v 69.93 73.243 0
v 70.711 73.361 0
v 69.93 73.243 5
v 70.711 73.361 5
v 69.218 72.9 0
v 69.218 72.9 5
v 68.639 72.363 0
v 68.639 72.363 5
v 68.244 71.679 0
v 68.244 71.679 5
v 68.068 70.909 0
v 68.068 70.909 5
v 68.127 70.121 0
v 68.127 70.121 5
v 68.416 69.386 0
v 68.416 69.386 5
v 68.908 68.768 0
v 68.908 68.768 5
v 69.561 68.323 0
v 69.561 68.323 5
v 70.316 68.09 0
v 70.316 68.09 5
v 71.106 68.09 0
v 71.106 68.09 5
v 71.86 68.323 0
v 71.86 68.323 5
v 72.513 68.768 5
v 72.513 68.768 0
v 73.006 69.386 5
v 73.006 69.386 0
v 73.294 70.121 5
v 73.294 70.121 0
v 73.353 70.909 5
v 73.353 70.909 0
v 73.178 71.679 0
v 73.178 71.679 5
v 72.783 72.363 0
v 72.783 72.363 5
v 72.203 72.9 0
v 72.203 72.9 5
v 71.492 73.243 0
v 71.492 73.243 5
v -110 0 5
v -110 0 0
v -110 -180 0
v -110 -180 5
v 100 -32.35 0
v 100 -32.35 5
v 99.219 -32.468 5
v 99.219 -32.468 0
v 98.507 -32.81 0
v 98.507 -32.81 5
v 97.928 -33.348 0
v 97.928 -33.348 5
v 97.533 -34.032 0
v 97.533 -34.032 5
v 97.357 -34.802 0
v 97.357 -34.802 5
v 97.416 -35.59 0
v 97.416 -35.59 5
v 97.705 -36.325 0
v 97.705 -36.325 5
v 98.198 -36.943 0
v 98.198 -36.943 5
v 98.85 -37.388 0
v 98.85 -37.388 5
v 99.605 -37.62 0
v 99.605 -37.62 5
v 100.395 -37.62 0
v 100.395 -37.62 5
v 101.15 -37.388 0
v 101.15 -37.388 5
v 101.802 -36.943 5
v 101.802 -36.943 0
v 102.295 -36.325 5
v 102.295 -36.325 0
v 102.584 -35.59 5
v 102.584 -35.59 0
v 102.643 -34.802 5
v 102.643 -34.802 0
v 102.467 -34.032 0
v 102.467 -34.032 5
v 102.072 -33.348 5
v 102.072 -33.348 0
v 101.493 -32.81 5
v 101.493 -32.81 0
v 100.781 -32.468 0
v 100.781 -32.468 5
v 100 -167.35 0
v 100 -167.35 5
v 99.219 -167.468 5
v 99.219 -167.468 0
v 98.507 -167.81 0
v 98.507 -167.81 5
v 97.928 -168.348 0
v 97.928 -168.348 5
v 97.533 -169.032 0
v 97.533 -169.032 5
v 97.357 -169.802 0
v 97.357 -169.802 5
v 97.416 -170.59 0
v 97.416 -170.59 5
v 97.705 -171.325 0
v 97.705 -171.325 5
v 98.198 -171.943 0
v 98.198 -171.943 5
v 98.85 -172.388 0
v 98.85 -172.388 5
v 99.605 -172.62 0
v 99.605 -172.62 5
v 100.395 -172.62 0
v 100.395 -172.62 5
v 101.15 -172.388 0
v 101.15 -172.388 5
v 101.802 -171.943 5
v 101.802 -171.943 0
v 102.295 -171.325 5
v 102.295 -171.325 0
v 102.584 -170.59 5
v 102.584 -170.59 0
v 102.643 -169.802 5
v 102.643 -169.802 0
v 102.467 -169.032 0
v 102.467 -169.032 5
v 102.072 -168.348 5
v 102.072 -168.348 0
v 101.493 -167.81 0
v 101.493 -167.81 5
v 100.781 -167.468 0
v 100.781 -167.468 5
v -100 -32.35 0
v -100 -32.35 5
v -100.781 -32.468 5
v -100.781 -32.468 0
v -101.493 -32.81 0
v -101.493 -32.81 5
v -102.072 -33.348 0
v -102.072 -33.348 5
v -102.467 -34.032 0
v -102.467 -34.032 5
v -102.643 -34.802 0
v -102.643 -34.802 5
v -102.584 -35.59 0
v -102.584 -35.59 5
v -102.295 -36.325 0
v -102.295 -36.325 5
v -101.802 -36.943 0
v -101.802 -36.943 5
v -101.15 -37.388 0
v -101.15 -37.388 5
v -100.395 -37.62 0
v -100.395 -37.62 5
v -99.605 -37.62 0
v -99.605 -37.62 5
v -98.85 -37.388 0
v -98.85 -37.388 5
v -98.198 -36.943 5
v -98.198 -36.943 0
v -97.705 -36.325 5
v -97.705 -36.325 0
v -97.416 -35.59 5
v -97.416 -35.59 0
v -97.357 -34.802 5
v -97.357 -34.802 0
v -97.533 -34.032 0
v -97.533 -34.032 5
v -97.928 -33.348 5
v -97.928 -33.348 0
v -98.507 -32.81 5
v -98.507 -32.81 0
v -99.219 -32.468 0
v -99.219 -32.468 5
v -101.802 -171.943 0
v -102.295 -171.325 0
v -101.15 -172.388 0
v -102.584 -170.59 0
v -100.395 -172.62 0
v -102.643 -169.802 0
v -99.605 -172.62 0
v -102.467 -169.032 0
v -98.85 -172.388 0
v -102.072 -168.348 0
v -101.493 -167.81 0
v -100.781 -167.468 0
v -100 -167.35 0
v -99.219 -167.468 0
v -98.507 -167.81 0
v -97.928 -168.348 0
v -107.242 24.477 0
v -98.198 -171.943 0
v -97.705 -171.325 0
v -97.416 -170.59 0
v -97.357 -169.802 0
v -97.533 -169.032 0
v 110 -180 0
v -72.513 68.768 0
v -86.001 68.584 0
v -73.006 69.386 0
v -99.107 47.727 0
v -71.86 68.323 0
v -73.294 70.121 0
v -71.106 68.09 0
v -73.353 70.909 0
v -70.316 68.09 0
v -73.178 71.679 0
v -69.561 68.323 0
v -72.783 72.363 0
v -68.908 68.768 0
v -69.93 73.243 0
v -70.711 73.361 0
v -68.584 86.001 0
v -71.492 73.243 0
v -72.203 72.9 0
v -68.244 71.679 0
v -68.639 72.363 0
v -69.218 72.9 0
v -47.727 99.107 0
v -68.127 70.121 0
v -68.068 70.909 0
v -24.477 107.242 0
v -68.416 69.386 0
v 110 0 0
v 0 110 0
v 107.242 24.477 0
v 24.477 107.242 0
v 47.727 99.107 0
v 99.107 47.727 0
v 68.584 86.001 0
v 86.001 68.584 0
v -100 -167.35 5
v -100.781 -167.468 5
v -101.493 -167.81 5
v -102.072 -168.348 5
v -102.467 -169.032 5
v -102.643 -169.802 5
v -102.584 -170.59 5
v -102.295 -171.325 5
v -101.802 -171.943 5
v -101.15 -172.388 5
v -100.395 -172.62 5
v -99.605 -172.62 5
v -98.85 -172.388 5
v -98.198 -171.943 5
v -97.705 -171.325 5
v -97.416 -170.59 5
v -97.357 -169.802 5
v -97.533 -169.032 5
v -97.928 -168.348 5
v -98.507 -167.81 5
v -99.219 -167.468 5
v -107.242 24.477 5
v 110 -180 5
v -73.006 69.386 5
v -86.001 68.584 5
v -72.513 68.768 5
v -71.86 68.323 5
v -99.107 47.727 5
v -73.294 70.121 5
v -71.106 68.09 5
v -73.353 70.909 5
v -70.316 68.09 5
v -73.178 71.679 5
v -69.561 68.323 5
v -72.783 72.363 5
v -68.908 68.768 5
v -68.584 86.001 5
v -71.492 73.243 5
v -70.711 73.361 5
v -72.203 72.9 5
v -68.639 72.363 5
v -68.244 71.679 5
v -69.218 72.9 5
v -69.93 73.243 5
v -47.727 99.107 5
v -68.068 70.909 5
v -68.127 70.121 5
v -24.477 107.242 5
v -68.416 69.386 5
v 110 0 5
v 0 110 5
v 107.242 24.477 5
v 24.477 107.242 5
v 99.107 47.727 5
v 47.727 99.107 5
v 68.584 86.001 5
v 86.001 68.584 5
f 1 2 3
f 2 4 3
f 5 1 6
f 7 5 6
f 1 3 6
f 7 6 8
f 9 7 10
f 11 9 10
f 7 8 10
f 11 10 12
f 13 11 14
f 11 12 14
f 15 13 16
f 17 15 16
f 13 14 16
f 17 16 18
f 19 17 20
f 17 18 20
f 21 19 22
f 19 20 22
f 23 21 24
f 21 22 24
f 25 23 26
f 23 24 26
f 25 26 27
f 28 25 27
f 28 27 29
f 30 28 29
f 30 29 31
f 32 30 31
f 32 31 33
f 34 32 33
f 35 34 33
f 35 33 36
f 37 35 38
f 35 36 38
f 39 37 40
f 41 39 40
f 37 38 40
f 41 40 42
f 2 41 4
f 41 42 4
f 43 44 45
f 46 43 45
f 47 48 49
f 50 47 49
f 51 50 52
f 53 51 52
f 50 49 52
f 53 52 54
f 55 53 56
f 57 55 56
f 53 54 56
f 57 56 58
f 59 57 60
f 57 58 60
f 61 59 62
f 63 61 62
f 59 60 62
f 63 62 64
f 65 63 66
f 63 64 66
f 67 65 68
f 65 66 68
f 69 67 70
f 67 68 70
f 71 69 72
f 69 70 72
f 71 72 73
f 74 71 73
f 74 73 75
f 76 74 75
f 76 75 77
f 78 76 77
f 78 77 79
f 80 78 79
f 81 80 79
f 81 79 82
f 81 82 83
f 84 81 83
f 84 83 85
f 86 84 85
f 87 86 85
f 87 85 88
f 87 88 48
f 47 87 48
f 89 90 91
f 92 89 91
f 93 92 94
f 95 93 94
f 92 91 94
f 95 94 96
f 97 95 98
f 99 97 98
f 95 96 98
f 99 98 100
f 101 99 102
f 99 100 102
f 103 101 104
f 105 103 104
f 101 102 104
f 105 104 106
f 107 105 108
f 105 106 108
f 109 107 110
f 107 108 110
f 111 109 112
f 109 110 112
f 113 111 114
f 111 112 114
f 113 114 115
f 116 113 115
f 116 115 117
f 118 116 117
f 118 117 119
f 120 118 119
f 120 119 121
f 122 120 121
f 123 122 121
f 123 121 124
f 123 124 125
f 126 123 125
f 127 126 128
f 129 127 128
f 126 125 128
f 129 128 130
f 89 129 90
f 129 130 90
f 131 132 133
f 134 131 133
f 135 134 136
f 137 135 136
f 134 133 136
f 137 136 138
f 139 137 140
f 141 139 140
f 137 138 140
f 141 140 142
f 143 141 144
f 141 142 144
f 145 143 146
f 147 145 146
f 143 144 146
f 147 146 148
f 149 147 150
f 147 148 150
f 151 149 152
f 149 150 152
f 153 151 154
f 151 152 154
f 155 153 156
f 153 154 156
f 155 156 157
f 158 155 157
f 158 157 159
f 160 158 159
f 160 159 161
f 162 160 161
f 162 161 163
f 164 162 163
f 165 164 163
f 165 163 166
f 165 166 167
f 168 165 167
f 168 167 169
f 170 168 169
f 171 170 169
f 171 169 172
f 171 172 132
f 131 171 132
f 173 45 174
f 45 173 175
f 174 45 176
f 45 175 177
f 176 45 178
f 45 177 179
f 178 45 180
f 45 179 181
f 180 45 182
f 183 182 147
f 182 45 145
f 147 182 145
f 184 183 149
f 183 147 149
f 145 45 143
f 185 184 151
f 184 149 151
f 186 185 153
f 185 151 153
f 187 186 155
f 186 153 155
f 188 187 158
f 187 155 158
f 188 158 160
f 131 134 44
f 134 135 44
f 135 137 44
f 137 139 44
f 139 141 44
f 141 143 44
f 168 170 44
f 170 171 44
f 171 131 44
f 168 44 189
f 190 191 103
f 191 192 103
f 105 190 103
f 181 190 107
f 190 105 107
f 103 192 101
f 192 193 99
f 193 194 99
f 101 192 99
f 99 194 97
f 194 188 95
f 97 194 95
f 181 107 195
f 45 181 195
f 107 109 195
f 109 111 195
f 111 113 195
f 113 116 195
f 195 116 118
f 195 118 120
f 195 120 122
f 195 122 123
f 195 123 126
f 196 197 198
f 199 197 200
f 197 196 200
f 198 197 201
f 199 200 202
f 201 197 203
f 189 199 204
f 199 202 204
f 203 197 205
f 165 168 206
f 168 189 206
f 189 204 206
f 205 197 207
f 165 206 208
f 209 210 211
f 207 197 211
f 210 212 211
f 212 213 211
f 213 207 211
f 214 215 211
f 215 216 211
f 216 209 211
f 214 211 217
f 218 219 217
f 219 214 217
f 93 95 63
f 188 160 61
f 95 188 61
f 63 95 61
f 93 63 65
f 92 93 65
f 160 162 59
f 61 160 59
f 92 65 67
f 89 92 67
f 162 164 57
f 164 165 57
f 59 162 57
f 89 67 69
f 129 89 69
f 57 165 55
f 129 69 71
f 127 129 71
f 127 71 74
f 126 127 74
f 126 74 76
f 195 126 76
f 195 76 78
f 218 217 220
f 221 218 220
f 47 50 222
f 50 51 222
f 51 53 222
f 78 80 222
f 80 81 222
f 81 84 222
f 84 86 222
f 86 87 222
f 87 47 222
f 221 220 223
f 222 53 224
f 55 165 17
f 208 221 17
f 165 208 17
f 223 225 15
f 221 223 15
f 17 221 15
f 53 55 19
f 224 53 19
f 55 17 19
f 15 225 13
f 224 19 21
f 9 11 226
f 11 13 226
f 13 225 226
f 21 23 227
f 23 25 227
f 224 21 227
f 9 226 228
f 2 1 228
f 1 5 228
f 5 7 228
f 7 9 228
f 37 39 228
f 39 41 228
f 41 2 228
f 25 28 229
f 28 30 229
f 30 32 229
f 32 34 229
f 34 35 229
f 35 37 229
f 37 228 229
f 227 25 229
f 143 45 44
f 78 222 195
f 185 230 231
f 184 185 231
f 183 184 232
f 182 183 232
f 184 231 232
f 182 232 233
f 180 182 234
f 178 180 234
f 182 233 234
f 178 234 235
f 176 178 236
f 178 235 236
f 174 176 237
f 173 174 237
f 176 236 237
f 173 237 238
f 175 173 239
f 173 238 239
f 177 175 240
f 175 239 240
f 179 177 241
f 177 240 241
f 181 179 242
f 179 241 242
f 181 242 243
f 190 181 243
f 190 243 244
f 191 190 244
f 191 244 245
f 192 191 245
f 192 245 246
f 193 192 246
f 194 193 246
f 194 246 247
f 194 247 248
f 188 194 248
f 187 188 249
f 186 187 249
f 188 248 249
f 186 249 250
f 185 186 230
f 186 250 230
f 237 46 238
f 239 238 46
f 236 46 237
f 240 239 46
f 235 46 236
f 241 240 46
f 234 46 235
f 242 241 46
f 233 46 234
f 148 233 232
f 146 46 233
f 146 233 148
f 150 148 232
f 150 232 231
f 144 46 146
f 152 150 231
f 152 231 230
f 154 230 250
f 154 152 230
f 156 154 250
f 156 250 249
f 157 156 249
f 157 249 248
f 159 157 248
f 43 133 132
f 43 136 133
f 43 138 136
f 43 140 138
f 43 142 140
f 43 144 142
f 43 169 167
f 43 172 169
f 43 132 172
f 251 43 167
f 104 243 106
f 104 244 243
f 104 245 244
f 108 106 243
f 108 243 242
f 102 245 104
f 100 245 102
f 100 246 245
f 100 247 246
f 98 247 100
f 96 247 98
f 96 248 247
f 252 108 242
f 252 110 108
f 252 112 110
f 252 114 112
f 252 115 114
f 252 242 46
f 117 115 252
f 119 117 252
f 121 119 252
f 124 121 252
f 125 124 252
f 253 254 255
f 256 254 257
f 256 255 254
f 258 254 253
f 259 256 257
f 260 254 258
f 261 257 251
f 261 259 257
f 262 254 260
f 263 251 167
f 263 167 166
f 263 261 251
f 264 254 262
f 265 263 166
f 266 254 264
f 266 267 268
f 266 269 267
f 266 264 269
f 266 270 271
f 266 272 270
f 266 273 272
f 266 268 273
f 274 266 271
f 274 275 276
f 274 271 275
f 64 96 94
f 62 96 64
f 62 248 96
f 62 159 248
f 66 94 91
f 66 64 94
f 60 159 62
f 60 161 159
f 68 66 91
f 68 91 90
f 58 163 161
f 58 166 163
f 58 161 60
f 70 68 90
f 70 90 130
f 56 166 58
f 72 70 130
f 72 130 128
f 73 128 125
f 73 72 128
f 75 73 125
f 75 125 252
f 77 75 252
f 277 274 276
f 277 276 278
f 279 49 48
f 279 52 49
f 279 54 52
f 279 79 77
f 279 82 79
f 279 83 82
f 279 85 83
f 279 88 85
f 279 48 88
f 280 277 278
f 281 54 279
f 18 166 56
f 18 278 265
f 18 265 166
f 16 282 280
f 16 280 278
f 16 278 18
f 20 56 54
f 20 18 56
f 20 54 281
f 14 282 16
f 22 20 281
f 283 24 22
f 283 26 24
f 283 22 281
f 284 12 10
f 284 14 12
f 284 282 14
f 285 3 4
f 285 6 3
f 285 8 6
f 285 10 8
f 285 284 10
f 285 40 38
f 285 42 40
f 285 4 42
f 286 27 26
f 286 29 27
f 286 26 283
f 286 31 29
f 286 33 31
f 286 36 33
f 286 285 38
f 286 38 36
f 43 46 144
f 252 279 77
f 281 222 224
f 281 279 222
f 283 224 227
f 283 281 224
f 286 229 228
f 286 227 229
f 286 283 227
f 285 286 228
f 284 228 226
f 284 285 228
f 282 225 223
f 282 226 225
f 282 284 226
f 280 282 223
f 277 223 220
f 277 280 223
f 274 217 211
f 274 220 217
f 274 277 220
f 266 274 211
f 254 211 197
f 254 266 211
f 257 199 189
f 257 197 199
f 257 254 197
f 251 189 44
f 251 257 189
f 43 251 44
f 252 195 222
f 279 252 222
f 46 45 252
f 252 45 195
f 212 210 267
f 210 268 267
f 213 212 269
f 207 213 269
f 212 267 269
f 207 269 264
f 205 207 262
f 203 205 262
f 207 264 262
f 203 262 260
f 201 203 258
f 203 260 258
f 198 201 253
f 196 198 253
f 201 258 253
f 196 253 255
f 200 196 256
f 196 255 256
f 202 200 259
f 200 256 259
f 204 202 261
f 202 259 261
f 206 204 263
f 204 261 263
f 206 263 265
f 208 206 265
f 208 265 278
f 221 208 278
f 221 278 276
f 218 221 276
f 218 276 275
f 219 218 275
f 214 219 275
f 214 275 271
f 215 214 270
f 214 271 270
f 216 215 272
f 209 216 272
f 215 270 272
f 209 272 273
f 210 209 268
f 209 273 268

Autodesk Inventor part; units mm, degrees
ref_plane "YZ Plane" through (0, 0, 0) normal (1, 0, 0) x (0, 1, 0)
ref_plane "XZ Plane" through (0, 0, 0) normal (0, 1, 0) x (-1, 0, 0)
ref_plane "XY Plane" through (0, 0, 0) normal (0, 0, 1) x (1, 0, 0)
sketch "Skizze1" plane through (0, 0, 0) normal (0, 0, 1) x (1, 0, 0)
  line L0 (-110, -110) -> (110, -110)
  line L1 (110, -110) -> (110, 110)
  line L2 (110, 110) -> (-110, 110)
  line L3 (-110, 110) -> (-110, -110)
  line L4 (-110, -110) -> (110, 110) construction
  line L5 (110, -110) -> (-110, 110) construction
  circle A0 centre (0, 0) radius 95 construction
  circle A1 centre (0, 0) radius 105 construction
  line L6 (-90, 90) -> (-110, 90) construction
  line L7 (-110, 90) -> (-110, 110) construction
  line L8 (-110, 110) -> (-90, 110) construction
  line L9 (-90, 110) -> (-90, 90) construction
  line L10 (-90, 90) -> (-110, 110) construction
  line L11 (-110, 90) -> (-90, 110) construction
  line L12 (110, -110) -> (-110, -110)
  line L13 (-110, -110) -> (-110, -180)
  line L14 (-110, -180) -> (110, -180)
  line L15 (110, -180) -> (110, -110)
  line L16 (90, 90) -> (110, 90) construction
  line L17 (110, 90) -> (110, 110) construction
  line L18 (110, 110) -> (90, 110) construction
  line L19 (90, 110) -> (90, 90) construction
  line L20 (90, 90) -> (110, 110) construction
  line L21 (110, 90) -> (90, 110) construction
  line L22 (90, -160) -> (110, -160) construction
  line L23 (110, -160) -> (110, -180) construction
  line L24 (110, -180) -> (90, -180) construction
  line L25 (90, -180) -> (90, -160) construction
  line L26 (90, -160) -> (110, -180) construction
  line L27 (110, -160) -> (90, -180) construction
  line L28 (-90, -160) -> (-110, -160) construction
  line L29 (-110, -160) -> (-110, -180) construction
  line L30 (-110, -180) -> (-90, -180) construction
  line L31 (-90, -180) -> (-90, -160) construction
  line L32 (-90, -160) -> (-110, -180) construction
  line L33 (-110, -160) -> (-90, -180) construction
  line L34 (-90, -90) -> (-110, -90) construction
  line L35 (-110, -90) -> (-110, -110) construction
  line L36 (-110, -110) -> (-90, -110) construction
  line L37 (-90, -110) -> (-90, -90) construction
  line L38 (-90, -90) -> (-110, -110) construction
  line L39 (-110, -90) -> (-90, -110) construction
  line L40 (90, -90) -> (110, -90) construction
  line L41 (110, -90) -> (110, -110) construction
  line L42 (110, -110) -> (90, -110) construction
  line L43 (90, -110) -> (90, -90) construction
  line L44 (90, -90) -> (110, -110) construction
  line L45 (110, -90) -> (90, -110) construction
  circle A2 centre (0, 0) radius 87.5
  line L46 (110, 45.5635) -> (45.5635, 110) construction
  line L47 (-45.5635, 110) -> (-110, 45.5635) construction
  line L48 (45.5635, 110) -> (-45.5635, 110)
  line L49 (-45.5635, 110) -> (45.5635, 110) construction
  line L50 (45.5635, 110) -> (110, 45.5635) construction
  line L51 (110, 45.5635) -> (110, -45.5635) construction
  line L52 (110, -45.5635) -> (45.5635, -110) construction
  line L53 (45.5635, -110) -> (-45.5635, -110) construction
  line L54 (-45.5635, -110) -> (-110, -45.5635) construction
  line L55 (-110, -45.5635) -> (-110, 45.5635) construction
  line L56 (-110, 45.5635) -> (-45.5635, 110) construction
  line L57 (110, 0) -> (110, 110)
  line L58 (-110, 0) -> (-110, 110)
  line L59 (110, 0) -> (110, 110)
  line L60 (110, 110) -> (-110, 110)
  line L61 (-110, 110) -> (-110, 0)
  arc A3 (110, 0) -> (0, 110) centre (0, 0) ccw
  arc A4 (0, 110) -> (-110, 0) centre (0, 0) ccw
  circle A5 centre (100, -170) radius 18.5 construction
  circle A6 centre (100, -35) radius 18.5 construction
  circle A7 centre (70.7107, 70.7107) radius 18.5 construction
  circle A8 centre (-70.7107, 70.7107) radius 18.5 construction
  circle A9 centre (-100, -35) radius 18.5 construction
  circle A10 centre (0, 0) radius 100 construction
  line L62 (100, -170) -> (100, 100) construction
  line L63 (-100, -170) -> (-100, 100) construction
  line L64 (110, -20) -> (110, 0) construction
  line L65 (110, 0) -> (90, -70) construction
  line L66 (-110, -20) -> (-110, 0) construction
  point P0 (-100, -100)
  point P1 (100, -100)
  dimension "d0" = 190
  dimension "d1" = 10
  dimension "d2" = 220
  dimension "d3" = 20
  dimension "d4" = 70
  dimension "d14" = 175
  dimension "d15" = 45
  dimension "d16" = 45
  dimension "d21" = 37
  dimension "d25" = 10
  dimension "d26" = 145
  dimension "d27" = 145
  dimension "d28" = 10
  dimension "d29" = 200
extrude "Extrusion1" add sketch "Skizze1" along normal blind 5 contours L3 A4 A3 L1 L0 | L0 L15 L14 L13 | L3 L2 A4 | A3 L2 L1 | A2
hole "Bohrung1" at (100, -170, 0) at (-100, -170, 0) at (-100, 100, 0) at (100, 100, 0) at (-100, -35, 0) at (-70.7107, 70.7107, 0) at (70.7107, 70.7107, 0) at (100, -35, 0) direction (0, 0, 1) diameter 5.3 end through all
sketch "Skizze2" plane through (0, 0, 5) normal (0, 0, 1) x (1, 0, 0)
  circle A0 centre (-100, 100) radius 2.65 projected
  circle A1 centre (100, -170) radius 2.65 projected
  circle A2 centre (-100, -170) radius 2.65 projected
  circle A3 centre (100, 100) radius 2.65 projected
  line L0 (-110, 110) -> (-110, -180) projected
  line L1 (-110, -180) -> (110, -180) projected
  line L2 (110, -180) -> (110, 110) projected
  line L3 (110, 110) -> (-110, 110) projected
  arc A4 (110, 0) -> (-110, 0) centre (0, 0) ccw
  line L4 (110, -180) -> (110, 110) projected
  line L5 (-110, 110) -> (-110, -180) projected
  line L6 (110, 110) -> (-110, 110) projected
  dimension "d22" = 50
  dimension "d23" = 35
extrude "Extrusion3" cut sketch "Skizze2" against normal through all contours L3 A4 L0 | L3 L2 A4
ref_plane "Arbeitsebene1" through (0, -180, 0) normal (-1, 0, 0) x (0, 0, 1)
equation "\"d16\" = d15"
equation "\"d27\" = d26"
equation "\"d28\" = d25"
properties part number "BasePlate_A" material "Aluminium 6061"
